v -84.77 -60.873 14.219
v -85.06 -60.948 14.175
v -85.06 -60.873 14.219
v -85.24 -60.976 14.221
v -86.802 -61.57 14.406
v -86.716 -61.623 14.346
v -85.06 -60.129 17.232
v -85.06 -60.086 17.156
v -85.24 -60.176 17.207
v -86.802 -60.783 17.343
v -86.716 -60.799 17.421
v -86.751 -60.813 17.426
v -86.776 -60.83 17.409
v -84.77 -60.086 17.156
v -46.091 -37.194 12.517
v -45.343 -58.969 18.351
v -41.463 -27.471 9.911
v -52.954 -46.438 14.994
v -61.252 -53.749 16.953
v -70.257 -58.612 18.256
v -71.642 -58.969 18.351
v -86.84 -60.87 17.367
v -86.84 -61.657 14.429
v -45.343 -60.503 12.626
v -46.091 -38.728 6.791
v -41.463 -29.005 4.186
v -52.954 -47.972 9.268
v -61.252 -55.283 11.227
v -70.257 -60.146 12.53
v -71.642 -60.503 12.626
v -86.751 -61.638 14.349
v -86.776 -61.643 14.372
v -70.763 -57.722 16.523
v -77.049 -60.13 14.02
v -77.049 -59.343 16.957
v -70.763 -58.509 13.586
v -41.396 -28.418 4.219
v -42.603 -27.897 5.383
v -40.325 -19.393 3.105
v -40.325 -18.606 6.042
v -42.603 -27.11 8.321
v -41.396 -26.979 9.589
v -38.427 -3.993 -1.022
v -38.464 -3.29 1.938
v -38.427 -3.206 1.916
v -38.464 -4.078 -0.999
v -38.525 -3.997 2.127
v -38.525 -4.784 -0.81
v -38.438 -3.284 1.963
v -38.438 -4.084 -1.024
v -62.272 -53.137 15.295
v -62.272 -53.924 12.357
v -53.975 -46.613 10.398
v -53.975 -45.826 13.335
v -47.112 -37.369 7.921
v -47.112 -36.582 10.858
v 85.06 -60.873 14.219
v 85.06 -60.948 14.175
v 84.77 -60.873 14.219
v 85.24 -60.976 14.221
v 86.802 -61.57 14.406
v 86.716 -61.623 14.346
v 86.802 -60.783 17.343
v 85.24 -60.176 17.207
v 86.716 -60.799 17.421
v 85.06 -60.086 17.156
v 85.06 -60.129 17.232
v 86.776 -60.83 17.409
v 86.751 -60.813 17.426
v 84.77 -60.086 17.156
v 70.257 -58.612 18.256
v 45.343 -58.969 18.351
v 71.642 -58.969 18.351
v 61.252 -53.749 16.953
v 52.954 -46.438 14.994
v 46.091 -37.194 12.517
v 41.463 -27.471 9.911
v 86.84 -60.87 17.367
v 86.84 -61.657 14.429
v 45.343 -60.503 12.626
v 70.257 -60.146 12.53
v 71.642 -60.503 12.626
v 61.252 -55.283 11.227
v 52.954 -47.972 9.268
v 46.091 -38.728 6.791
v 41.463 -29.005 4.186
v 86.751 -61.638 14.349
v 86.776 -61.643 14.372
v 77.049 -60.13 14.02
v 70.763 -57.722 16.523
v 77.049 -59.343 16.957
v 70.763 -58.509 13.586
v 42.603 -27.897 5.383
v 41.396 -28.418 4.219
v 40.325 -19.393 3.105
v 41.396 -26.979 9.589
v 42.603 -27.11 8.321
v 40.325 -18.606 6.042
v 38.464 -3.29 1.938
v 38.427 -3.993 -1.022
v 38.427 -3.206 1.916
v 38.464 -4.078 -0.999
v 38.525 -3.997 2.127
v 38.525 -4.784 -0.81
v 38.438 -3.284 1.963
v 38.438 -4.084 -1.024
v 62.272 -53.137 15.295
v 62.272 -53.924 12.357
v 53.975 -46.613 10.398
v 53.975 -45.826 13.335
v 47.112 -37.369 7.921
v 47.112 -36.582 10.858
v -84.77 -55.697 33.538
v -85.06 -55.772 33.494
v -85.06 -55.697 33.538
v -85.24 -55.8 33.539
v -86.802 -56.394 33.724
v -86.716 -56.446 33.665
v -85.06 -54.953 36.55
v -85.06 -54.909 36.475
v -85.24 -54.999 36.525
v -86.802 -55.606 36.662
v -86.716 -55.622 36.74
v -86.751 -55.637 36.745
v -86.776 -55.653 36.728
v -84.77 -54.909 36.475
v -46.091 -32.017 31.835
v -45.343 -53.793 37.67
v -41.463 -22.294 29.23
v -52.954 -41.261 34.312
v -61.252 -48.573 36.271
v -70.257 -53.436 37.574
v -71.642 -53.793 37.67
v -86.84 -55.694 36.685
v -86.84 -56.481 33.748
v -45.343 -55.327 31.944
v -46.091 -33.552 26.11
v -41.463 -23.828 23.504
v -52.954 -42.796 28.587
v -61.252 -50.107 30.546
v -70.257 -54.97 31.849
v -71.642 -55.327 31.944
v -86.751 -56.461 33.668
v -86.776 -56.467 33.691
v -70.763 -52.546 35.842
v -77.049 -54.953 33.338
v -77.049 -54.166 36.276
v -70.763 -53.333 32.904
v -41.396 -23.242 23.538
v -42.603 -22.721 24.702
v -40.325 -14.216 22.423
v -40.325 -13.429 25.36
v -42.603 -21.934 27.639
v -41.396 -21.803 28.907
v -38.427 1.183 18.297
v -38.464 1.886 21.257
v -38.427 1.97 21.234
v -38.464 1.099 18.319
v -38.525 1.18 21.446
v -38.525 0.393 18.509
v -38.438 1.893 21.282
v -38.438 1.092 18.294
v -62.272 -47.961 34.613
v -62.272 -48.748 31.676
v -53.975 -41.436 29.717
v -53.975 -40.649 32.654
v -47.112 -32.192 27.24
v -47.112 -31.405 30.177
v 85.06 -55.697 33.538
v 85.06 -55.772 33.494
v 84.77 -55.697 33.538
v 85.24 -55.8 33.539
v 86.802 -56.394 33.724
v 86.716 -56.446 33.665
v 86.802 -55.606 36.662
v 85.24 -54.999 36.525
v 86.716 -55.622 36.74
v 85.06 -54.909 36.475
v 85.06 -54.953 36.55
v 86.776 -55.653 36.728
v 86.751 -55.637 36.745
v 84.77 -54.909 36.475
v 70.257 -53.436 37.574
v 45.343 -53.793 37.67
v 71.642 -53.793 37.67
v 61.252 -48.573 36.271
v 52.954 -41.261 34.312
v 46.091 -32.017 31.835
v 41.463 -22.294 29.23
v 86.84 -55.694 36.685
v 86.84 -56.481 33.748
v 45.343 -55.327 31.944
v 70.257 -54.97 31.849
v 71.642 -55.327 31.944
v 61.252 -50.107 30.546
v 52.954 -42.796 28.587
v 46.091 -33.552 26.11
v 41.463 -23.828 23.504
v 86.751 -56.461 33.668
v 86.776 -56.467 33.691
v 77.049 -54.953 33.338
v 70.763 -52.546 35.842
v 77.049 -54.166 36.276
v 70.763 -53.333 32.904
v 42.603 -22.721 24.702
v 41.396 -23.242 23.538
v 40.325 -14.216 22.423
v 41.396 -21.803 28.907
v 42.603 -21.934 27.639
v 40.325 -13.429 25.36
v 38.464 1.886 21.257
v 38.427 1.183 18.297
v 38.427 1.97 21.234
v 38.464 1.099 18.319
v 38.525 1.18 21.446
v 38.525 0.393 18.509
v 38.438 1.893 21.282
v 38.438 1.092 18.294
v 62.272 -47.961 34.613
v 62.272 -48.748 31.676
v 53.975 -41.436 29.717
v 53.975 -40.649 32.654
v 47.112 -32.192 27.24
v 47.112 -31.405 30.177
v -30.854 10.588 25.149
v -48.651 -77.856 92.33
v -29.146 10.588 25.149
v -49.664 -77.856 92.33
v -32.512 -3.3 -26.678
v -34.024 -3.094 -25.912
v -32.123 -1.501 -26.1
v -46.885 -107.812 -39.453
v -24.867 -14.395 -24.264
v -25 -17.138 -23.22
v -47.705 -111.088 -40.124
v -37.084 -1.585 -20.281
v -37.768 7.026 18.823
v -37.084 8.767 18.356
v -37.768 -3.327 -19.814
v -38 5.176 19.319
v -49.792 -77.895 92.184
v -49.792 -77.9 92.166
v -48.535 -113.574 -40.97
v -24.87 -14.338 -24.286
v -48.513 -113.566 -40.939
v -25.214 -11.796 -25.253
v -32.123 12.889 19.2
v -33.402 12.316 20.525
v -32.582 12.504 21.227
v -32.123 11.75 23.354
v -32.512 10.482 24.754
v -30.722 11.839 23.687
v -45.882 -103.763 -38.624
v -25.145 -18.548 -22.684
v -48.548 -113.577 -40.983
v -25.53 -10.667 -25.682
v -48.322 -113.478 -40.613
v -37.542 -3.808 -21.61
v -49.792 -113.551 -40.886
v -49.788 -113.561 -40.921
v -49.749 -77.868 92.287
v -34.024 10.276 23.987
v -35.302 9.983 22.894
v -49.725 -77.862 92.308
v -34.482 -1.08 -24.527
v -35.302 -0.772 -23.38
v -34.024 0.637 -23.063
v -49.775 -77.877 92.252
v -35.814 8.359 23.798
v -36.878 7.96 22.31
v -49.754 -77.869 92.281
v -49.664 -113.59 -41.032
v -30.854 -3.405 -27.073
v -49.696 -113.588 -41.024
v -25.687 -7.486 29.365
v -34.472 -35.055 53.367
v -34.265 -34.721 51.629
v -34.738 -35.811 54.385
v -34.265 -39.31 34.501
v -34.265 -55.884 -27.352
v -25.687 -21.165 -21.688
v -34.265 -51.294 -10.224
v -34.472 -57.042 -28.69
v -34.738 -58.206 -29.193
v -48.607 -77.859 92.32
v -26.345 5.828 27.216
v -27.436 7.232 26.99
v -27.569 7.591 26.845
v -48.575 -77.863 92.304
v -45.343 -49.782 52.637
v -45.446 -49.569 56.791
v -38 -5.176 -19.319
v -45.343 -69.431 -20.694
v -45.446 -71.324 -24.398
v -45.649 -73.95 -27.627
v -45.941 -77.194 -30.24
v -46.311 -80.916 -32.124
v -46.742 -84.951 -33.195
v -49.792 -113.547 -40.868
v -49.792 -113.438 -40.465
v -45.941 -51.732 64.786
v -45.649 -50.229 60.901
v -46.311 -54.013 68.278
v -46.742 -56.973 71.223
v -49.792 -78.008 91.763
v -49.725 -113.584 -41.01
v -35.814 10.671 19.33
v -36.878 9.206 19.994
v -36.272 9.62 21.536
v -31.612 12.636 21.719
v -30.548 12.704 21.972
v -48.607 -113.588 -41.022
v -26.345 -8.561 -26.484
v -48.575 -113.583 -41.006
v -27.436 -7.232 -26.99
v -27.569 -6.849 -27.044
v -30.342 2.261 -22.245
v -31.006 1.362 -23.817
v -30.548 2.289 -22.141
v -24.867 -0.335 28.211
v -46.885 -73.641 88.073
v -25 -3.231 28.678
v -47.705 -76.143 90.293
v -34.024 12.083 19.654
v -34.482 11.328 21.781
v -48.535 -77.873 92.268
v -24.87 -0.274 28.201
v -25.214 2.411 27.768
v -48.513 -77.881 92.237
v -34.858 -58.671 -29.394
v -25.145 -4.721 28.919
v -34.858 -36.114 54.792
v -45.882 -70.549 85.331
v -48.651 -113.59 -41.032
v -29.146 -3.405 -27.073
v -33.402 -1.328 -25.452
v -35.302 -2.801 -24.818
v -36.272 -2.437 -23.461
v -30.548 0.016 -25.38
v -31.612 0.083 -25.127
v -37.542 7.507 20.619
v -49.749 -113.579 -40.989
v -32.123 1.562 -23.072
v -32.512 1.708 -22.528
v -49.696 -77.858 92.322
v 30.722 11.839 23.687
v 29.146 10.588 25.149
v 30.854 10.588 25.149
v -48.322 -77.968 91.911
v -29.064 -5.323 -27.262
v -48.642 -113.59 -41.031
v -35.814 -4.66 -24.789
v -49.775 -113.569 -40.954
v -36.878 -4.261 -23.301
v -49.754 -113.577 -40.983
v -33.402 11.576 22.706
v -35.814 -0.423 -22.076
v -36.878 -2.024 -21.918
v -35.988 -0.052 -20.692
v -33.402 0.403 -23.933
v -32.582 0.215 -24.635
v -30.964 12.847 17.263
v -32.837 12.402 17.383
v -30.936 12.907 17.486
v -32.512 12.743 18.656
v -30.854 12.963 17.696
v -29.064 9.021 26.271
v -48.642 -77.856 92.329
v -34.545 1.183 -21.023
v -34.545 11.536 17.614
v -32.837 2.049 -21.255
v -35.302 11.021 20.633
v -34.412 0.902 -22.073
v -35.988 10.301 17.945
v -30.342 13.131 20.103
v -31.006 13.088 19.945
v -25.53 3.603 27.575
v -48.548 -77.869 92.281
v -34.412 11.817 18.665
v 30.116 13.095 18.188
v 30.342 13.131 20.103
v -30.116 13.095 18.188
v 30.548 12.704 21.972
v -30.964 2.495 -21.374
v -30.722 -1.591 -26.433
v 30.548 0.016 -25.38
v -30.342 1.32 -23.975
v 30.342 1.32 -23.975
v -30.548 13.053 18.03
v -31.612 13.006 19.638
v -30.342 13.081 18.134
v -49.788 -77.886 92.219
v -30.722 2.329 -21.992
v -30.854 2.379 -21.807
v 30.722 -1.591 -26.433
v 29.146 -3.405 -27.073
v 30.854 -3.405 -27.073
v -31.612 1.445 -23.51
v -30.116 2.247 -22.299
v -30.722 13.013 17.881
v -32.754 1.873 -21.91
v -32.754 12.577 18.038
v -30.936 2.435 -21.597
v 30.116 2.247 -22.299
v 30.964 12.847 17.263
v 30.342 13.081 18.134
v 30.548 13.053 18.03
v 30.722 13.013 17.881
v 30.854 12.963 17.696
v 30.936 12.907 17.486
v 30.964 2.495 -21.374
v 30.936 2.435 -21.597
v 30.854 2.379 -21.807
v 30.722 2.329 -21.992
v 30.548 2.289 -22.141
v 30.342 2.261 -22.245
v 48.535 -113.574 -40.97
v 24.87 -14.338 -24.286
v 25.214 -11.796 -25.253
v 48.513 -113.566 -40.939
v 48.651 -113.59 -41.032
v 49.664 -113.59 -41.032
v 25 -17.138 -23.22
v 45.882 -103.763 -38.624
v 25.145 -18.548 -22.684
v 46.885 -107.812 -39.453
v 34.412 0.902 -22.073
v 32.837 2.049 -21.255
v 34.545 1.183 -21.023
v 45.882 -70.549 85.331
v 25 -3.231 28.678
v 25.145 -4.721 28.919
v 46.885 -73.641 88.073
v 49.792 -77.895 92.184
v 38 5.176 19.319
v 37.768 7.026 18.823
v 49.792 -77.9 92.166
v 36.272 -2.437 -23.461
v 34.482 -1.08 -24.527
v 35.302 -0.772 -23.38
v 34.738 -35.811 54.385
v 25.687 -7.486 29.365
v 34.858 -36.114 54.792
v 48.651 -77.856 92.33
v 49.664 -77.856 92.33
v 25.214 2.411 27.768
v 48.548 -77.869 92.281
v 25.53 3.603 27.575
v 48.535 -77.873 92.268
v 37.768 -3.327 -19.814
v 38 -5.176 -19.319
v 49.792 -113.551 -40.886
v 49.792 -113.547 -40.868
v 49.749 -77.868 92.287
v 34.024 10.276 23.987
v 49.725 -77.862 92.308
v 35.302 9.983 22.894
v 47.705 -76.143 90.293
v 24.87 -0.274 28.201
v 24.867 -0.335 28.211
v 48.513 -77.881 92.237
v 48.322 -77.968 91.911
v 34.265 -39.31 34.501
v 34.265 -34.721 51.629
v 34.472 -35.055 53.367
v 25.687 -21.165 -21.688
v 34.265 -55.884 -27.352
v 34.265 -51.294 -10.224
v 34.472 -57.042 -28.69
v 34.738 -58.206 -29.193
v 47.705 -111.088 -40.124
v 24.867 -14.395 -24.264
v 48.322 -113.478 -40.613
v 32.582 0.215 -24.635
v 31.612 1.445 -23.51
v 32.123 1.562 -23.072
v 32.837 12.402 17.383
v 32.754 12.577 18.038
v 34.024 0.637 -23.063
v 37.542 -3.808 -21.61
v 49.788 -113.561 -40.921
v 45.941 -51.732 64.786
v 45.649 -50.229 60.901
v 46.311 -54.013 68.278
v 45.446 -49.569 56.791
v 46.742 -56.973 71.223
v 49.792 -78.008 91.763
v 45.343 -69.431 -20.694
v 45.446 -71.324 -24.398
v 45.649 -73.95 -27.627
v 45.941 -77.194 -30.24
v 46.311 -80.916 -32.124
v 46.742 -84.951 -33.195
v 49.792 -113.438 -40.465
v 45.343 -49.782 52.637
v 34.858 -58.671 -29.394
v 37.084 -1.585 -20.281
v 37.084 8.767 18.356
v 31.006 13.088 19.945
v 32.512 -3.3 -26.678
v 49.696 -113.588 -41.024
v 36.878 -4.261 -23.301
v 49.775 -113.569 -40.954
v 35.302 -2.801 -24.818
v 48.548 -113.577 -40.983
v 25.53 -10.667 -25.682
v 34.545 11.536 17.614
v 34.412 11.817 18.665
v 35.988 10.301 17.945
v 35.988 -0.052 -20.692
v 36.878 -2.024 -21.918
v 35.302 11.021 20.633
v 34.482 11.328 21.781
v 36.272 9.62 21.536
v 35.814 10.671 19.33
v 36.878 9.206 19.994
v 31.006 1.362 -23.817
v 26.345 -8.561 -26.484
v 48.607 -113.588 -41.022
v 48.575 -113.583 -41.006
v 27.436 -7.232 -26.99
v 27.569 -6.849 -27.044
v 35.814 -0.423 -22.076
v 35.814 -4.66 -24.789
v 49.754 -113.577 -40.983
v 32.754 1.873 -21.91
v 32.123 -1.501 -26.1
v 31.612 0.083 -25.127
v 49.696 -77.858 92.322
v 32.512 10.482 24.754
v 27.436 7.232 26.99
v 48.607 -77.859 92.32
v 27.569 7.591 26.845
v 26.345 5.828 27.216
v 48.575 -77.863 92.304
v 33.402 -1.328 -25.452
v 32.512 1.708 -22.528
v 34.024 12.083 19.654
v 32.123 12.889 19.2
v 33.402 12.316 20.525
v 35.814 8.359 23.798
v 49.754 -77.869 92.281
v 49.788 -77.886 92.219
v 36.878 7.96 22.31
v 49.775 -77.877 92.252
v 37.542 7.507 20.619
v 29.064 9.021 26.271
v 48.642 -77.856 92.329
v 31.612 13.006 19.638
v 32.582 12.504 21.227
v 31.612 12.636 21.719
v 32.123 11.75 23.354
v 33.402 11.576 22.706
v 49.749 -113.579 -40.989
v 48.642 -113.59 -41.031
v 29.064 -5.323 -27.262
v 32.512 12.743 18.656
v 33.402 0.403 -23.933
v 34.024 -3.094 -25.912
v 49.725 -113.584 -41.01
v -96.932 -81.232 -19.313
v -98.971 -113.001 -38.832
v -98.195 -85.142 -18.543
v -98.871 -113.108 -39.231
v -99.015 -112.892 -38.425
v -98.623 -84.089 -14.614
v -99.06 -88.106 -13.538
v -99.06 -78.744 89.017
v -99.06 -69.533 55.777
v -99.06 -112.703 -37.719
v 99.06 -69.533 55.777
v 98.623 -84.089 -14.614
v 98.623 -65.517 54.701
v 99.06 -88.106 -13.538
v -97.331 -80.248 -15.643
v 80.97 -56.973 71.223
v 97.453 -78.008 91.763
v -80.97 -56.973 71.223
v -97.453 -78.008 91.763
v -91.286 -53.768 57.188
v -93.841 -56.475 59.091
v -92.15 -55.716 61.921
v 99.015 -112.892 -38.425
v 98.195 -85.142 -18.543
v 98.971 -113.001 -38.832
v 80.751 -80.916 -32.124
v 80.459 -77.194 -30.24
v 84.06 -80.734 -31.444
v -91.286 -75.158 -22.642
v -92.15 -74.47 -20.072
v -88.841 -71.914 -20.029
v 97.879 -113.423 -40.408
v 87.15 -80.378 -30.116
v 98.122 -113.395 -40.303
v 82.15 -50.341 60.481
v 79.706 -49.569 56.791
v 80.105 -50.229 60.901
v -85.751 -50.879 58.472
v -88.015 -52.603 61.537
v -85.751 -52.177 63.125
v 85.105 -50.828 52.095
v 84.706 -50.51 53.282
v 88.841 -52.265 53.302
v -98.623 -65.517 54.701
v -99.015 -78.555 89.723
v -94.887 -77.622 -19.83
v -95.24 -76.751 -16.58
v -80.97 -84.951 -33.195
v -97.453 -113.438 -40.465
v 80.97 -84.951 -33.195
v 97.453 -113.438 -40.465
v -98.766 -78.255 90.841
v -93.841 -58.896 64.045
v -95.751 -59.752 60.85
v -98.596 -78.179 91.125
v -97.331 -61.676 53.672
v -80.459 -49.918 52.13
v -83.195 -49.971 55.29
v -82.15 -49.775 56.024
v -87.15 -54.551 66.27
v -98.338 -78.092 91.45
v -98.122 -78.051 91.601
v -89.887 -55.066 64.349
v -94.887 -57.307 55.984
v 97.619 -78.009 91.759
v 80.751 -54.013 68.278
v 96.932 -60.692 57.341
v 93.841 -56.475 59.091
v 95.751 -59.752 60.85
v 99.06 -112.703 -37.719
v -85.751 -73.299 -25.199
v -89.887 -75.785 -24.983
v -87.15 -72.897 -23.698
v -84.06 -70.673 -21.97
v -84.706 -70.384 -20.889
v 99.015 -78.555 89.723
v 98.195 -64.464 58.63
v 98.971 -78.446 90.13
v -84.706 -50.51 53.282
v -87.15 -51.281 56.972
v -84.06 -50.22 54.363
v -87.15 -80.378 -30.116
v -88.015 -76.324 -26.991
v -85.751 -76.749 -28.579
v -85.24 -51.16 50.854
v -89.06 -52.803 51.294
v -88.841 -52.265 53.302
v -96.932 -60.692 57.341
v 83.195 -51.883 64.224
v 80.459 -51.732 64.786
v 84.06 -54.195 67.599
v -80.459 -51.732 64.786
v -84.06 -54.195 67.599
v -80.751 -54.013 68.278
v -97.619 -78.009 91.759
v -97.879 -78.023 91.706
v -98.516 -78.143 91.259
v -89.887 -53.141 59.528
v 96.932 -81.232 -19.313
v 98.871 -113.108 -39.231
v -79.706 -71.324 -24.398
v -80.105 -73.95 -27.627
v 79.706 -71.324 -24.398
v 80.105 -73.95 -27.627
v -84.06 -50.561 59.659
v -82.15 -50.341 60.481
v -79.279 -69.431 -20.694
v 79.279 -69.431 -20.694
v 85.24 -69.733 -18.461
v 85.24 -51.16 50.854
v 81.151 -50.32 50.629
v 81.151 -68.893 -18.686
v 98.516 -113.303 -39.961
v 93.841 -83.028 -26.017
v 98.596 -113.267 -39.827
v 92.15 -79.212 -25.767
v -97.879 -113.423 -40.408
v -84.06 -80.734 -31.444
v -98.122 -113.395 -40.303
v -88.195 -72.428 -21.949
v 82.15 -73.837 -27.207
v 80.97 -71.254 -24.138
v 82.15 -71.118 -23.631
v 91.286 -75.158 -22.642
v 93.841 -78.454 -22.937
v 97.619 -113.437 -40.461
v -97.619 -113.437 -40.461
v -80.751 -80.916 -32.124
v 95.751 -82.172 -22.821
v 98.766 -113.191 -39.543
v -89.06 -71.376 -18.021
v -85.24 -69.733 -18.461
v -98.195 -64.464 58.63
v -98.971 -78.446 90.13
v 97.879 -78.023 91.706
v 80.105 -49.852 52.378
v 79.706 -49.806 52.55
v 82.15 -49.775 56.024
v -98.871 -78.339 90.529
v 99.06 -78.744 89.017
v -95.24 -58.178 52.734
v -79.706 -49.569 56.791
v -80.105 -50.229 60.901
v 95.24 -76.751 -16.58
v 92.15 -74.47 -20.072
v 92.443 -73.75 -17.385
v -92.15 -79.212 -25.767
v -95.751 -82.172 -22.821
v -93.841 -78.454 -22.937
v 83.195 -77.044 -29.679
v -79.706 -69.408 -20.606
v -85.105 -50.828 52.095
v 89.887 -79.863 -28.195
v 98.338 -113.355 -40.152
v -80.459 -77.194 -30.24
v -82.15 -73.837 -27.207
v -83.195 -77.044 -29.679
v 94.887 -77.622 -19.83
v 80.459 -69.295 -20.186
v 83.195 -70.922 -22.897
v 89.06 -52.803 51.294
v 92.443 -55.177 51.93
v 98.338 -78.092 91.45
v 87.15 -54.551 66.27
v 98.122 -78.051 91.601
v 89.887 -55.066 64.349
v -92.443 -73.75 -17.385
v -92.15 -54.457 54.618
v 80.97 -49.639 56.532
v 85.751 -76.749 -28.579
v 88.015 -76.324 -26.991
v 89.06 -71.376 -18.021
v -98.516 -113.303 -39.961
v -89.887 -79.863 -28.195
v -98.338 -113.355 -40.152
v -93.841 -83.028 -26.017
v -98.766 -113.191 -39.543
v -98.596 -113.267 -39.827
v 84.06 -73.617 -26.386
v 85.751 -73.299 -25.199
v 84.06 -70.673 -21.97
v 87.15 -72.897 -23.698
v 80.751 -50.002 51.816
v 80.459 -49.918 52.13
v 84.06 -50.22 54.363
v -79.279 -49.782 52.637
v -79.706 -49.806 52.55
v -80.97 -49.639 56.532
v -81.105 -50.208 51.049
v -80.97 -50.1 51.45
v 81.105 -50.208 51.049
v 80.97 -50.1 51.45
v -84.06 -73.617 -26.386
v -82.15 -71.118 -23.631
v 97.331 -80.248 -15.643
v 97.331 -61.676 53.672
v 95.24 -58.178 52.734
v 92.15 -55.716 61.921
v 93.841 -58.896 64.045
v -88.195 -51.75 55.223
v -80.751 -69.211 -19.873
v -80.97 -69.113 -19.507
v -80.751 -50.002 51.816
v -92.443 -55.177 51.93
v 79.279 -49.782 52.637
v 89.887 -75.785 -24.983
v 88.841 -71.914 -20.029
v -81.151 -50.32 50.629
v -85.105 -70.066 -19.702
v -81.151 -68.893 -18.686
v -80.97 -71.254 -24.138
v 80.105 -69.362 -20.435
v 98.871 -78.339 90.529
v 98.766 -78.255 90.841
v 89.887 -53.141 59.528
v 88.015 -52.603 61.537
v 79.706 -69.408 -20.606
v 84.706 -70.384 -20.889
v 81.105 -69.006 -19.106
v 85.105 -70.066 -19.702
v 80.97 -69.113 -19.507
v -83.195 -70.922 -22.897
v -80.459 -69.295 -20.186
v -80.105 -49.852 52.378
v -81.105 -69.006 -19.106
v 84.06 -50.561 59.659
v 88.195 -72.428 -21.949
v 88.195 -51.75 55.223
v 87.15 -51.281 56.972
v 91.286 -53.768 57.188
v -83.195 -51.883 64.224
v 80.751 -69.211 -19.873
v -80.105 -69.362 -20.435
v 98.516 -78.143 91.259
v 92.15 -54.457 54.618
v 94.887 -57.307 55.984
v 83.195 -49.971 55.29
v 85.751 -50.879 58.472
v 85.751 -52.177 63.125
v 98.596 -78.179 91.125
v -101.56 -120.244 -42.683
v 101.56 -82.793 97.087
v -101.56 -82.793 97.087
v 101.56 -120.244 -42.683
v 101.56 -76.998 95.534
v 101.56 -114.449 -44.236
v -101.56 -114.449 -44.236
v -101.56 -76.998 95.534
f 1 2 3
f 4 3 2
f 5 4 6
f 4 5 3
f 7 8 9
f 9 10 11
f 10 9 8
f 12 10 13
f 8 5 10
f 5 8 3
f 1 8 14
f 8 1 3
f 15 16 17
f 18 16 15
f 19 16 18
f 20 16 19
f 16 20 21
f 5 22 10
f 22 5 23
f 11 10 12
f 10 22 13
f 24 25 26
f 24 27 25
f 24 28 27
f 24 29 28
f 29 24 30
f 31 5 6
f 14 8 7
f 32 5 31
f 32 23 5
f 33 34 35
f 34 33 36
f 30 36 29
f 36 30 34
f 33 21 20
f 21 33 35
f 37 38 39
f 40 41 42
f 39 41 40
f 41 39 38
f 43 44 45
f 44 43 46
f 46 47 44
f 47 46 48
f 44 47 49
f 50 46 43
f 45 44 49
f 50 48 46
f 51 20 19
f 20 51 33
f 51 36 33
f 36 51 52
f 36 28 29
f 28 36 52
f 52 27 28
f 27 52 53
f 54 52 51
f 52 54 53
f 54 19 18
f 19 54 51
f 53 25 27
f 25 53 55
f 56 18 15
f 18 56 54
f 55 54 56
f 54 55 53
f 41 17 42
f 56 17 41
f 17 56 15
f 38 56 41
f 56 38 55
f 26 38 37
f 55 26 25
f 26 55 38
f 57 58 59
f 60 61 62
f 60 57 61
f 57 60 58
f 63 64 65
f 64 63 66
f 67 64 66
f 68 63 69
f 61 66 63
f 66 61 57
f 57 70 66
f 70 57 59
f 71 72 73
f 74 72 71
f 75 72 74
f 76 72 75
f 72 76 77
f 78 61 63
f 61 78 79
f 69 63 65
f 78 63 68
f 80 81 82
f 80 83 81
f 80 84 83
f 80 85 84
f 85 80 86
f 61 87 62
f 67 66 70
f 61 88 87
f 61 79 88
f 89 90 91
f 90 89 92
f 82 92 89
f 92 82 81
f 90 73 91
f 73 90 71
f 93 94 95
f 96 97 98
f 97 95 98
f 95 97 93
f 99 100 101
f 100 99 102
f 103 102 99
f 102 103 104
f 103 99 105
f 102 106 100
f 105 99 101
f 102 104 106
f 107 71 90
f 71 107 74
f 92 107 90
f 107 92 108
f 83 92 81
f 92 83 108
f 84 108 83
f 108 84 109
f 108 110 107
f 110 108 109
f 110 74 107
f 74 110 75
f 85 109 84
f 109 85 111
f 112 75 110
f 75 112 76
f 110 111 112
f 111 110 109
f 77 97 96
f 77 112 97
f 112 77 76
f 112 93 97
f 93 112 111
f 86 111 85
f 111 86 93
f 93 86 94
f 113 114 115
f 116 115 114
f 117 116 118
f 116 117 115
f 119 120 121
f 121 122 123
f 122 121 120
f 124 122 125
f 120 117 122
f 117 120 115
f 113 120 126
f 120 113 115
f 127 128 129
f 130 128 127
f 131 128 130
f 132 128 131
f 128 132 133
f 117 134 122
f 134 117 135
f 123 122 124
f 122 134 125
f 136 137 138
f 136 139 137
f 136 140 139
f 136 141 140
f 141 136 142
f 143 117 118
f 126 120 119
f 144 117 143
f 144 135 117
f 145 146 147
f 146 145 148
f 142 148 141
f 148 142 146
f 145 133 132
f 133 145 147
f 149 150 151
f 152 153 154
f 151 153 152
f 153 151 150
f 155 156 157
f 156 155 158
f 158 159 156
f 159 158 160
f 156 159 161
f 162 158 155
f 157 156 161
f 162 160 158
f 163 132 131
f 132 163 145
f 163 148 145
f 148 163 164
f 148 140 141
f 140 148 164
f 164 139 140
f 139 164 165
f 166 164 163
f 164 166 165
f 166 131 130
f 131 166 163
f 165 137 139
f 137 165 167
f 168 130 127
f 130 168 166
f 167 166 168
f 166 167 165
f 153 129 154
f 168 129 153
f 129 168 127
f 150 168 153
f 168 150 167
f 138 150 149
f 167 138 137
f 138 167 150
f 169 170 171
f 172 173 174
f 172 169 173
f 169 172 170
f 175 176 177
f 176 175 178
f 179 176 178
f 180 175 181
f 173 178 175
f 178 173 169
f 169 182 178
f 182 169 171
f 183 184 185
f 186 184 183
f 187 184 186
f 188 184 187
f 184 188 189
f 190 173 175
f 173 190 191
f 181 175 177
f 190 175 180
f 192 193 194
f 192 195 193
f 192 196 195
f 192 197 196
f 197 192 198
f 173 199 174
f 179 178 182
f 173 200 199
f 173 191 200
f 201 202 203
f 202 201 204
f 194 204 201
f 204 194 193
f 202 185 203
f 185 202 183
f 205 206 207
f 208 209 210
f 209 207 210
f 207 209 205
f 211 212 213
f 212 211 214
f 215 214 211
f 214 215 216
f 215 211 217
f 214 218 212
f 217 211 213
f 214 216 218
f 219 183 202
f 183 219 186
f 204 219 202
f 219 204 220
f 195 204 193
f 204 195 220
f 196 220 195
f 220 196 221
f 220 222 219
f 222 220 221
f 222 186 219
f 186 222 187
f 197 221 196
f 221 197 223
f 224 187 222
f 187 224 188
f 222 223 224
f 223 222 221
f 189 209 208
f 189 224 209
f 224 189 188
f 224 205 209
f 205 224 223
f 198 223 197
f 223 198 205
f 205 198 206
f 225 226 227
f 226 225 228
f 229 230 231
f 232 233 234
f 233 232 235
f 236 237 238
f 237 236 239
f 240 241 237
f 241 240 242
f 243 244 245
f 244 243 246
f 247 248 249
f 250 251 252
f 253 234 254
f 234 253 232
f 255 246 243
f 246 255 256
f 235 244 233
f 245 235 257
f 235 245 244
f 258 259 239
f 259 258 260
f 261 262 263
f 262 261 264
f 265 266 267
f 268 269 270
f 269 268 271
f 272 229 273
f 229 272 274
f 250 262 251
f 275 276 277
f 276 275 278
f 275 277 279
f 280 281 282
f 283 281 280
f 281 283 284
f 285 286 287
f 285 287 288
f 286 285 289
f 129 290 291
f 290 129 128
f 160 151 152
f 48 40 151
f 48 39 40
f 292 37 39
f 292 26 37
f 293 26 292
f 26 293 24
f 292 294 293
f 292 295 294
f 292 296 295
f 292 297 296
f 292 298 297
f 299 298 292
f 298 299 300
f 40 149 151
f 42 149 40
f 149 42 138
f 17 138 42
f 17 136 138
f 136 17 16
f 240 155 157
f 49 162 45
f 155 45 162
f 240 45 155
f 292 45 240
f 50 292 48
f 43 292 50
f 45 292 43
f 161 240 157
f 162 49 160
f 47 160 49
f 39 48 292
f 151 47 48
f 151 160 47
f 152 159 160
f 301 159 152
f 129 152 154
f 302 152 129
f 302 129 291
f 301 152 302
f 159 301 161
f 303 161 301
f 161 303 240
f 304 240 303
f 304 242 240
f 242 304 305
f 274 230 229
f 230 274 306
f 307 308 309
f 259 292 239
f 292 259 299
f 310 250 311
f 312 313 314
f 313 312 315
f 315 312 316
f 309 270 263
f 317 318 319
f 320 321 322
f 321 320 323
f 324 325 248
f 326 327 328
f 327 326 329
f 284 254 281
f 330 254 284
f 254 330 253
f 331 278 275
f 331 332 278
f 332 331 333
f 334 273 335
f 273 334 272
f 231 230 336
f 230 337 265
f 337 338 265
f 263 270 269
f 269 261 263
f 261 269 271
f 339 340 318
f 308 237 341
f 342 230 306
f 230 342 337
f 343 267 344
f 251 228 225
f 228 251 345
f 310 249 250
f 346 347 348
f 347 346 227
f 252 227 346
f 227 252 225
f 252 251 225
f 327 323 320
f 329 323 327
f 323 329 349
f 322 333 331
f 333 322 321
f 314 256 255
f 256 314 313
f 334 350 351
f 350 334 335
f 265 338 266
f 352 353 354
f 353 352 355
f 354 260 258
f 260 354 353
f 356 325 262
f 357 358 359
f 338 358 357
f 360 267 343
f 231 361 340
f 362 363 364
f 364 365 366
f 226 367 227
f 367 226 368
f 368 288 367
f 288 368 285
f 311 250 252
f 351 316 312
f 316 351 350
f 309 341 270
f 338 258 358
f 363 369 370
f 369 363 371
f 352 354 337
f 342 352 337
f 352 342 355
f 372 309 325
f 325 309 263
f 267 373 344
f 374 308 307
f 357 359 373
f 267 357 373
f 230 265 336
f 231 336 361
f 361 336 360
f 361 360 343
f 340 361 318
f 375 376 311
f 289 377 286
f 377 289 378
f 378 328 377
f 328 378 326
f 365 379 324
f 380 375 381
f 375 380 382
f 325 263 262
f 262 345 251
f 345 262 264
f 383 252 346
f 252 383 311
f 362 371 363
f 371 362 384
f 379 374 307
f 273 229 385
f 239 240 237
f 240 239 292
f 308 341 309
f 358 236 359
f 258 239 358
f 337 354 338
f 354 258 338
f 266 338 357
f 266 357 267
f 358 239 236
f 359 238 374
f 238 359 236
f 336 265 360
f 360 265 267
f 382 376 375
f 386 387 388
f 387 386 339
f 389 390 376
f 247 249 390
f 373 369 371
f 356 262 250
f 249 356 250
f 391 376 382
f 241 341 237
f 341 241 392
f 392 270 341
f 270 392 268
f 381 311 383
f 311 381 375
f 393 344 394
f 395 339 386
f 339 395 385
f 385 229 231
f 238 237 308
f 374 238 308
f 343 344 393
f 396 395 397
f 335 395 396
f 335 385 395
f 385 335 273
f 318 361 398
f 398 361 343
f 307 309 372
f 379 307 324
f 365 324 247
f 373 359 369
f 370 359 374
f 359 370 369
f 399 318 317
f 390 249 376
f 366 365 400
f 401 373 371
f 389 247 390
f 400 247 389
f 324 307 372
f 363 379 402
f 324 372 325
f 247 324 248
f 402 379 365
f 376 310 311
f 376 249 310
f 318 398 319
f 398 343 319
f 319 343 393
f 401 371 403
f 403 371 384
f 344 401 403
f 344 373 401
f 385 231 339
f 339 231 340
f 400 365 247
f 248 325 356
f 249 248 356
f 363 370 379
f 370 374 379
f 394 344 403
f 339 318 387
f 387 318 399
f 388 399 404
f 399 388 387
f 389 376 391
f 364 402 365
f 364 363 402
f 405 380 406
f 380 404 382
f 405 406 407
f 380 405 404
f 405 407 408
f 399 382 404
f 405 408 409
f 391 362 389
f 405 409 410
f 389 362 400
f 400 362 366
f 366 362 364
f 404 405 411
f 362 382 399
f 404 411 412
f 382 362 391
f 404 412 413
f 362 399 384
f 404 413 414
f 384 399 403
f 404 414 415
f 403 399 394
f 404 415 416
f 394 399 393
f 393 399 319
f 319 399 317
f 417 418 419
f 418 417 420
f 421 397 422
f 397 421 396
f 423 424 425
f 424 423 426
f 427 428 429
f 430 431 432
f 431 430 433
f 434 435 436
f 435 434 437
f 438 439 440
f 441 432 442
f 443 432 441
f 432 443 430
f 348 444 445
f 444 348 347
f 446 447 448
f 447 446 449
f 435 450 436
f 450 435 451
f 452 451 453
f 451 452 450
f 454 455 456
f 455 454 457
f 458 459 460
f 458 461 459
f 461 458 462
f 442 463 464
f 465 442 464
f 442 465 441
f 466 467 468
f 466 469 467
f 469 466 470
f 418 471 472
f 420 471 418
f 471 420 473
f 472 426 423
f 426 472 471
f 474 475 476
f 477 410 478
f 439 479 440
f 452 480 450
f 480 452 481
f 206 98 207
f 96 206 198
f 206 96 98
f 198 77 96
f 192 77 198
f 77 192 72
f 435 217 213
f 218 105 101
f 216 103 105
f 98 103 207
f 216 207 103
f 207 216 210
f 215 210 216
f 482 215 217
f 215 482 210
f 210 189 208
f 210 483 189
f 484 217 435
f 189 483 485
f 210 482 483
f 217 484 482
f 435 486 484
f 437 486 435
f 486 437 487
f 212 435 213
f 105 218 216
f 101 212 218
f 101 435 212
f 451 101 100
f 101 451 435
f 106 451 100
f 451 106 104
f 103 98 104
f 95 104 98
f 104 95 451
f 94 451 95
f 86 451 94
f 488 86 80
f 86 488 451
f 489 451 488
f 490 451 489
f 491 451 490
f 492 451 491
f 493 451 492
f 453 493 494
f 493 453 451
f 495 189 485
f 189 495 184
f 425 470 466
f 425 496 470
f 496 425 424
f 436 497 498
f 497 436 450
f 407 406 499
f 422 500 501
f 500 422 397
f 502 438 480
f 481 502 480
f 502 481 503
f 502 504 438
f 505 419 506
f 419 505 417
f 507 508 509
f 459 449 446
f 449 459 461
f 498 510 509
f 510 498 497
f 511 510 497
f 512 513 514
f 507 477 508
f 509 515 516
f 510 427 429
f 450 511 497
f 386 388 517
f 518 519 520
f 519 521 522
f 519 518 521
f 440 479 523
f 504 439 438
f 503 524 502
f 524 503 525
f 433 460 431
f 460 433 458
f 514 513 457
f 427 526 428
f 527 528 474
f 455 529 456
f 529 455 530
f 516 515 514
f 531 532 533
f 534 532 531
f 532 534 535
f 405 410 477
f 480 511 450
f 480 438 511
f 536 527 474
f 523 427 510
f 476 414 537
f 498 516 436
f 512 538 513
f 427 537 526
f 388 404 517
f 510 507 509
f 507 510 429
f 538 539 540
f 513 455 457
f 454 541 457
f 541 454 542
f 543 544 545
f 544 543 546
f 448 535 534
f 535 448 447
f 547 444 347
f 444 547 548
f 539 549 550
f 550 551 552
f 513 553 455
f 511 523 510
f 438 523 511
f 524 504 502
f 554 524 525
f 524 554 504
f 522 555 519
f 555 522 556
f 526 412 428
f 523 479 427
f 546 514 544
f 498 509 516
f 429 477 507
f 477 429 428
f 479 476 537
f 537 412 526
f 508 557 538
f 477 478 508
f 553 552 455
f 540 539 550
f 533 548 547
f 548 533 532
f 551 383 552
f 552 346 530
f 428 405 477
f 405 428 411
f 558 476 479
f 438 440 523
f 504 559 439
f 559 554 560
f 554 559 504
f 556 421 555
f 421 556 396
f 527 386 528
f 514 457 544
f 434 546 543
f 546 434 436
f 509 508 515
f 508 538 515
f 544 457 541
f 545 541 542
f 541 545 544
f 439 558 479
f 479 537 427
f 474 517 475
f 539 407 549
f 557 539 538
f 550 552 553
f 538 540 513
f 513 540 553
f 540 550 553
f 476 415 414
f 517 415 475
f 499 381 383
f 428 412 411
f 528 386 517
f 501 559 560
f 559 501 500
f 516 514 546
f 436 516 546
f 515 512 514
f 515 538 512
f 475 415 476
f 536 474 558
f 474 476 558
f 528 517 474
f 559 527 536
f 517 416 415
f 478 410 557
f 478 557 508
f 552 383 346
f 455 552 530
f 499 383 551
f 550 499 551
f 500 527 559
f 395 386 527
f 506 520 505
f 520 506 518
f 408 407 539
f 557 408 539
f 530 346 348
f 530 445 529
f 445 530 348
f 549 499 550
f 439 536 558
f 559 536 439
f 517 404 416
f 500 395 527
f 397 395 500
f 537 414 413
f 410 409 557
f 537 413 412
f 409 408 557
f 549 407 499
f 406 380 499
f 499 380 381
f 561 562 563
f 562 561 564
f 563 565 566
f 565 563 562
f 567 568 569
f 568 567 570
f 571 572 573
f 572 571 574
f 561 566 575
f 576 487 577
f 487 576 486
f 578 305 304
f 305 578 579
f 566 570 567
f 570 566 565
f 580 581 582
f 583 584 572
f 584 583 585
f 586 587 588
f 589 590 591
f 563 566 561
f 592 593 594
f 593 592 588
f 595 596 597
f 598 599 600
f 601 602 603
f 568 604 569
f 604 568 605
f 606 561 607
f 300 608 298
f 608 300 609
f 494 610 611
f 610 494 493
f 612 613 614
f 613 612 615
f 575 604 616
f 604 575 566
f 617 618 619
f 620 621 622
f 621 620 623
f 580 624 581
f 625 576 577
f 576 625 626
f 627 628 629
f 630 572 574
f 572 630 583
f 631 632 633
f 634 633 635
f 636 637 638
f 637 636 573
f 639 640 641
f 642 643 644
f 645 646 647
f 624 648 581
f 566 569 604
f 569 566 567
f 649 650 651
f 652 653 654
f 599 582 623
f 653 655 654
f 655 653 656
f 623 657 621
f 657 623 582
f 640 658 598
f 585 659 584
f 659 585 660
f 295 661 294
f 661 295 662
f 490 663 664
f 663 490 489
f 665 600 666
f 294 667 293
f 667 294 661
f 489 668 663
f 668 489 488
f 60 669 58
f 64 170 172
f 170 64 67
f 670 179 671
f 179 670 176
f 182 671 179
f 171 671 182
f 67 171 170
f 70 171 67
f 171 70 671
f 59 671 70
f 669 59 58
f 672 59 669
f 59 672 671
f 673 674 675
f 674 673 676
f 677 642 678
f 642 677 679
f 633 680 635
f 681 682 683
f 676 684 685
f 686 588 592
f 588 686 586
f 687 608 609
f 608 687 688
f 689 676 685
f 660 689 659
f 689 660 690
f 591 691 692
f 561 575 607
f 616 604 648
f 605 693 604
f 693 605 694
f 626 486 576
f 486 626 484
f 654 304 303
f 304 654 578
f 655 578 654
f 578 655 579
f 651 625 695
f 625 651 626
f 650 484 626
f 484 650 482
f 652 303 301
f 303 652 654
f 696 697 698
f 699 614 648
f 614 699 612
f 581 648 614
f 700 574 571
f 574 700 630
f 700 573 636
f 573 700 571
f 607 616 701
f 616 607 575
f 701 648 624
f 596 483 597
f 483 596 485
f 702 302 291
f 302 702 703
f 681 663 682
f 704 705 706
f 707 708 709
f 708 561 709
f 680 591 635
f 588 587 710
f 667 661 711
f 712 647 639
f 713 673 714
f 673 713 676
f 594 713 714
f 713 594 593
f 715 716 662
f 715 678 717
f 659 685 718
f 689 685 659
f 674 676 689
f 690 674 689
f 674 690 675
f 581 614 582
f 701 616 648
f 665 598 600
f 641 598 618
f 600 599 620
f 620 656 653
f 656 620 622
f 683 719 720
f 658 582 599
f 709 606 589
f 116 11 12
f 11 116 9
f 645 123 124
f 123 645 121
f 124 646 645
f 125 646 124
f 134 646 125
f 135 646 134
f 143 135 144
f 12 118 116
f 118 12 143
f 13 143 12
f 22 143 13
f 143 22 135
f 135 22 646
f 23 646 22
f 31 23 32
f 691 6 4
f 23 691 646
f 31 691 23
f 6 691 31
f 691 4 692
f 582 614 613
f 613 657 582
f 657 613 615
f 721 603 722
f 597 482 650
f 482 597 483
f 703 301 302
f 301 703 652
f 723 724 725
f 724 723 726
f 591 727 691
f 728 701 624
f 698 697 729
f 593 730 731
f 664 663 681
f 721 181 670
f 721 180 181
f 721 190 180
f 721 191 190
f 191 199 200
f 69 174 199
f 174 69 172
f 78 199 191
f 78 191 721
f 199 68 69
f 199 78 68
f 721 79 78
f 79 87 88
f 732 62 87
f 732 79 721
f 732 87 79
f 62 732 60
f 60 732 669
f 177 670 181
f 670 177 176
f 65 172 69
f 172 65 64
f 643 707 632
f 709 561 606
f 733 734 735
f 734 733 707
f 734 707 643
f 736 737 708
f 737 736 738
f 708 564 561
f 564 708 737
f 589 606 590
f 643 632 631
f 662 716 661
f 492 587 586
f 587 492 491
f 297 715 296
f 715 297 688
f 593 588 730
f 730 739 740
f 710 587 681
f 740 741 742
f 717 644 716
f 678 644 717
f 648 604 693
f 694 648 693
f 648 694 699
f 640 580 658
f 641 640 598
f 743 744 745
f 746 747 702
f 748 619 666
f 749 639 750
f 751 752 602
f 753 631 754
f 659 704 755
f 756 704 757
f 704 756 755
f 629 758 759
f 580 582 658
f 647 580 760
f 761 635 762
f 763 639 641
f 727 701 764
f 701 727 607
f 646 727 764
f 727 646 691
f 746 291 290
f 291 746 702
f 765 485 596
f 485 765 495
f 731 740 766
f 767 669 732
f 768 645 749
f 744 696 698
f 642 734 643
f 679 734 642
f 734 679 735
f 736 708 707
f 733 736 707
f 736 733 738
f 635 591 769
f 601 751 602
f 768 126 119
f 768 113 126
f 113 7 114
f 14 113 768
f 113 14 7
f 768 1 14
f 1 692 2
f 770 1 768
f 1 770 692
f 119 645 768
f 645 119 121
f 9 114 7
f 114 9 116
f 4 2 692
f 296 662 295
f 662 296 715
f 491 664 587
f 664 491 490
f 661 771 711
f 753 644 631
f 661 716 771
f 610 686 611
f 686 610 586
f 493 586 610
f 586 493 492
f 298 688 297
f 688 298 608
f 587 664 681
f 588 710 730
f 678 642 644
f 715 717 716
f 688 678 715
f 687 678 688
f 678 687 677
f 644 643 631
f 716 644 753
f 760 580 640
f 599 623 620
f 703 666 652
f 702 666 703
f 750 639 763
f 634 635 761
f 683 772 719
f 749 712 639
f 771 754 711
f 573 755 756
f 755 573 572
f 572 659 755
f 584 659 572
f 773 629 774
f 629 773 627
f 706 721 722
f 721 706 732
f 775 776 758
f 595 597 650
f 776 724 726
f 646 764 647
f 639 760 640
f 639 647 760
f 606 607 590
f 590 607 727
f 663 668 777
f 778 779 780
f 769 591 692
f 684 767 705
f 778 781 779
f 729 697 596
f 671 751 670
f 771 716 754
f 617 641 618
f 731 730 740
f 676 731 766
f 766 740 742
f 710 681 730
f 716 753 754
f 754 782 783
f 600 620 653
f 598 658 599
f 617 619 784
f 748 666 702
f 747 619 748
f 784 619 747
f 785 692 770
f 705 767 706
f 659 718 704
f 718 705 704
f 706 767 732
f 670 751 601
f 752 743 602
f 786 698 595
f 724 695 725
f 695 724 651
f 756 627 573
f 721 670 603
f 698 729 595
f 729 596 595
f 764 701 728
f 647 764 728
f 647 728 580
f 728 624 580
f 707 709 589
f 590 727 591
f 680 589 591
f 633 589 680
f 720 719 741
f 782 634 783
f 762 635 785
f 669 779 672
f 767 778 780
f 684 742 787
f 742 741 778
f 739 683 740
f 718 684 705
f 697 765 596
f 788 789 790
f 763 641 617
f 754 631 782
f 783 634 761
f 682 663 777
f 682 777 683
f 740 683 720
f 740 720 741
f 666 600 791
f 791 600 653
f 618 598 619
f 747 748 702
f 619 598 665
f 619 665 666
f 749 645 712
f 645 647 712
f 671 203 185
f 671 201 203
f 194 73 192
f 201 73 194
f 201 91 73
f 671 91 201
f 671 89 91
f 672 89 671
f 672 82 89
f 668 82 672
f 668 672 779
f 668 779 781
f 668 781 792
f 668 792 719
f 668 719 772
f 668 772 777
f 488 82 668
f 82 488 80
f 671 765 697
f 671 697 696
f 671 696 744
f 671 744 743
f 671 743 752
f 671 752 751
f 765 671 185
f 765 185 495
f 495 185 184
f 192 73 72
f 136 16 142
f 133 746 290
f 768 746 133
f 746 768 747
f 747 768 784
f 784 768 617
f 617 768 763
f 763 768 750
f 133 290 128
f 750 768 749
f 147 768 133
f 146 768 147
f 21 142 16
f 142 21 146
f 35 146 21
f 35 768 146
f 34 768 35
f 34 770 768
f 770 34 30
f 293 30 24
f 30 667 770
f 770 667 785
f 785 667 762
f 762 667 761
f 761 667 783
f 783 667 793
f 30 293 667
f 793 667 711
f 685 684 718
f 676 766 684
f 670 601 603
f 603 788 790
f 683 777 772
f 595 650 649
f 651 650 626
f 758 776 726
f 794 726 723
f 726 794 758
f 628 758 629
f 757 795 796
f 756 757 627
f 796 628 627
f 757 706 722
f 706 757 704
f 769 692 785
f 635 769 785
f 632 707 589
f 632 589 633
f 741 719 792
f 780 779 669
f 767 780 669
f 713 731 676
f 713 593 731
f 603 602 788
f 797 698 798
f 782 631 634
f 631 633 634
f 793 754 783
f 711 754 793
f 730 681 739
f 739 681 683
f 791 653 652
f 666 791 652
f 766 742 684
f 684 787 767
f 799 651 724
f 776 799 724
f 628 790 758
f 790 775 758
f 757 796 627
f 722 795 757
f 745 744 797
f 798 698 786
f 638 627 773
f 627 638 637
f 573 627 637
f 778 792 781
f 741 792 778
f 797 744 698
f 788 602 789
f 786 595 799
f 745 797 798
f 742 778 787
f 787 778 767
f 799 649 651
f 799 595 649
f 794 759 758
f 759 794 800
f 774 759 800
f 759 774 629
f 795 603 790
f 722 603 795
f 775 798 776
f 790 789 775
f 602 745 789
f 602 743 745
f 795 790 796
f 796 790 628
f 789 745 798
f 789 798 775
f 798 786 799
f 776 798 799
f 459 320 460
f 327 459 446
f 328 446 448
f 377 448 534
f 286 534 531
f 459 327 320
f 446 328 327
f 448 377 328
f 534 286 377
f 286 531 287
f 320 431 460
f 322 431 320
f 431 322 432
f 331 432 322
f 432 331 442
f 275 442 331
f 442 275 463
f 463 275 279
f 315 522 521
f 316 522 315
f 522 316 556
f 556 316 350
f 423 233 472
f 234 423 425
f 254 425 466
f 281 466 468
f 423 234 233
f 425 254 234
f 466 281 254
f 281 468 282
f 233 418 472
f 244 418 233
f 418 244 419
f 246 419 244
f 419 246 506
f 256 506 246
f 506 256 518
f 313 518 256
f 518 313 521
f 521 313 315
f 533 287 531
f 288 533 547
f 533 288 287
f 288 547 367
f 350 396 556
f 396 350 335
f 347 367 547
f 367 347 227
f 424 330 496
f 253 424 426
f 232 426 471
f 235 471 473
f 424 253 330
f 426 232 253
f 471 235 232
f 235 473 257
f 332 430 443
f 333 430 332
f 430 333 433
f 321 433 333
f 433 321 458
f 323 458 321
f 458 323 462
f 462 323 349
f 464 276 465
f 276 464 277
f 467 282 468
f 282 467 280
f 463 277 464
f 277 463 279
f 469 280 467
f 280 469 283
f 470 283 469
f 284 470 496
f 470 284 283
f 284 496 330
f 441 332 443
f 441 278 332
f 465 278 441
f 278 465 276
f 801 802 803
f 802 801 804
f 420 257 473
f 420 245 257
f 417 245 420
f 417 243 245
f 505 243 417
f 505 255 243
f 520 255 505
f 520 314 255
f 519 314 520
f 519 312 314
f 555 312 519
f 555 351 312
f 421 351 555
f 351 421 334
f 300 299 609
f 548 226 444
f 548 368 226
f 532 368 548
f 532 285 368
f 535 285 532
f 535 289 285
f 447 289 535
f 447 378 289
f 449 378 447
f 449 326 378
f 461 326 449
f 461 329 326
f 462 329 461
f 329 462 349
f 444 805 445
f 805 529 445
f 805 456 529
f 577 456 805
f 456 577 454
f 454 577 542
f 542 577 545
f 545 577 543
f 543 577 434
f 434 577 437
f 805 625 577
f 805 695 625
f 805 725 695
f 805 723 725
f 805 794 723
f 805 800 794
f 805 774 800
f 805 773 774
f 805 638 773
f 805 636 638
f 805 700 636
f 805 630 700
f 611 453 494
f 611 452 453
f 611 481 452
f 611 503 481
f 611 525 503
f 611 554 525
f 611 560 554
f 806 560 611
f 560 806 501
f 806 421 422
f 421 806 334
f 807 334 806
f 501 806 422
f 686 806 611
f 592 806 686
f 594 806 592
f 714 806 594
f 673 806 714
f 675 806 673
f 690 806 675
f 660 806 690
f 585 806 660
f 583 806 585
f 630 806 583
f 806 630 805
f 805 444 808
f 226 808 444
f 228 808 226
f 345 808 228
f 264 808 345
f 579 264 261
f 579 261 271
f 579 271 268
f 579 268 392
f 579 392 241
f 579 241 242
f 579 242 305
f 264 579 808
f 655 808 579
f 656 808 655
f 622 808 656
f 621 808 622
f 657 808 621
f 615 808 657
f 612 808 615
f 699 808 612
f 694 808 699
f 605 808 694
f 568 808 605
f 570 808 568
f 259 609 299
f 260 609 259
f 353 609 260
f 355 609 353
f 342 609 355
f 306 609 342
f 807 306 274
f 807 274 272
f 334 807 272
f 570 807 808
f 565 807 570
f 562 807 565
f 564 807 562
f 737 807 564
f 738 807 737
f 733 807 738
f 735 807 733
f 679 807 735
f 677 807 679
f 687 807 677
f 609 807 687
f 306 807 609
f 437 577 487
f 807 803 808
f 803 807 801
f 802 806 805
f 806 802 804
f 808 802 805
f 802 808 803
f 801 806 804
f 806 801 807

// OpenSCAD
inches = 2.54;
LCD_largura = 78 * inches;
LCD_altura = 55 * inches;
LCD_espessura = 1;
CRT_profundidade = 40 * inches;

fundo_largura=60;
fundo_altura=40;
arredondamento = 8;
R = 20;


module strut_2d(){
    translate([-(LCD_largura - fundo_largura)/2 + R, -(CRT_profundidade - 2*R)])
  difference(){
    square([(LCD_largura - fundo_largura)/2 - R, CRT_profundidade - 2*R]);

    scale([((LCD_largura - fundo_largura)/2 - R)/(CRT_profundidade - 2*R),1])
    circle(r=(CRT_profundidade - 2*R));
  }
}

module strut(){
  translate([0, 0, CRT_profundidade*0.8 - R + arredondamento/2])
  rotate([90, 0])
  minkowski(){
    linear_extrude(height=1)
    strut_2d();

    sphere($fn=8, r=arredondamento/3);
  }
}

module LCD(){
  translate([-LCD_largura/2, -LCD_altura/2, CRT_profundidade])

  minkowski(){
    cube([LCD_largura, LCD_altura, LCD_espessura]);
    cube(5, center = true);
  }
}

module strut_pair(){
  translate([-fundo_largura*0.6, 0]) strut();
  mirror() translate([-fundo_largura*0.6, 0]) strut();
}

module caixa(){

  for (i=[0,1])
    translate([0,20*i, 0])
      strut_pair();

  hull(){
    for (i=[-1,1])
      for (j=[-1,1])
        translate([i*(LCD_largura/2 - R), j*(LCD_altura*0.4 - R), CRT_profundidade - R]) sphere(r=R);


    translate([-LCD_largura/2, -LCD_altura/2, CRT_profundidade])
    cube([LCD_largura, LCD_altura, LCD_espessura]);
  }

  hull(){
    translate([-fundo_largura/2, -fundo_altura/2])
    cube([fundo_largura, fundo_altura, 1]);

    for (i=[-1,1])
      for (j=[-1,1])
        translate([i*fundo_largura/2, j*fundo_altura/2]) sphere(r=arredondamento);


    translate([-LCD_largura/4, -LCD_altura/8, CRT_profundidade])
    cube([LCD_largura/2, LCD_altura/4, LCD_espessura]);
  }

  hull(){
    for (i=[-1,1])
      for (j=[-1,1])
        translate([i*(fundo_largura + LCD_largura/2)/4, j*fundo_altura, CRT_profundidade/2]) sphere(r=arredondamento/2);


    translate([-LCD_largura/4, -LCD_altura/2, CRT_profundidade])
    cube([LCD_largura/2, LCD_altura, LCD_espessura]);
  }

  for (i=[-1,1]){
    hull(){
      for (j=[-1,1])
        translate([i*fundo_largura/2, j*fundo_altura/2]) sphere(r=arredondamento);

      translate([i*LCD_largura/4, 0, CRT_profundidade])
      cube([LCD_espessura, LCD_altura, LCD_espessura], center=true);
    }
  }
}


rotate([90-15,0])
{
 caixa();
 LCD();
}
